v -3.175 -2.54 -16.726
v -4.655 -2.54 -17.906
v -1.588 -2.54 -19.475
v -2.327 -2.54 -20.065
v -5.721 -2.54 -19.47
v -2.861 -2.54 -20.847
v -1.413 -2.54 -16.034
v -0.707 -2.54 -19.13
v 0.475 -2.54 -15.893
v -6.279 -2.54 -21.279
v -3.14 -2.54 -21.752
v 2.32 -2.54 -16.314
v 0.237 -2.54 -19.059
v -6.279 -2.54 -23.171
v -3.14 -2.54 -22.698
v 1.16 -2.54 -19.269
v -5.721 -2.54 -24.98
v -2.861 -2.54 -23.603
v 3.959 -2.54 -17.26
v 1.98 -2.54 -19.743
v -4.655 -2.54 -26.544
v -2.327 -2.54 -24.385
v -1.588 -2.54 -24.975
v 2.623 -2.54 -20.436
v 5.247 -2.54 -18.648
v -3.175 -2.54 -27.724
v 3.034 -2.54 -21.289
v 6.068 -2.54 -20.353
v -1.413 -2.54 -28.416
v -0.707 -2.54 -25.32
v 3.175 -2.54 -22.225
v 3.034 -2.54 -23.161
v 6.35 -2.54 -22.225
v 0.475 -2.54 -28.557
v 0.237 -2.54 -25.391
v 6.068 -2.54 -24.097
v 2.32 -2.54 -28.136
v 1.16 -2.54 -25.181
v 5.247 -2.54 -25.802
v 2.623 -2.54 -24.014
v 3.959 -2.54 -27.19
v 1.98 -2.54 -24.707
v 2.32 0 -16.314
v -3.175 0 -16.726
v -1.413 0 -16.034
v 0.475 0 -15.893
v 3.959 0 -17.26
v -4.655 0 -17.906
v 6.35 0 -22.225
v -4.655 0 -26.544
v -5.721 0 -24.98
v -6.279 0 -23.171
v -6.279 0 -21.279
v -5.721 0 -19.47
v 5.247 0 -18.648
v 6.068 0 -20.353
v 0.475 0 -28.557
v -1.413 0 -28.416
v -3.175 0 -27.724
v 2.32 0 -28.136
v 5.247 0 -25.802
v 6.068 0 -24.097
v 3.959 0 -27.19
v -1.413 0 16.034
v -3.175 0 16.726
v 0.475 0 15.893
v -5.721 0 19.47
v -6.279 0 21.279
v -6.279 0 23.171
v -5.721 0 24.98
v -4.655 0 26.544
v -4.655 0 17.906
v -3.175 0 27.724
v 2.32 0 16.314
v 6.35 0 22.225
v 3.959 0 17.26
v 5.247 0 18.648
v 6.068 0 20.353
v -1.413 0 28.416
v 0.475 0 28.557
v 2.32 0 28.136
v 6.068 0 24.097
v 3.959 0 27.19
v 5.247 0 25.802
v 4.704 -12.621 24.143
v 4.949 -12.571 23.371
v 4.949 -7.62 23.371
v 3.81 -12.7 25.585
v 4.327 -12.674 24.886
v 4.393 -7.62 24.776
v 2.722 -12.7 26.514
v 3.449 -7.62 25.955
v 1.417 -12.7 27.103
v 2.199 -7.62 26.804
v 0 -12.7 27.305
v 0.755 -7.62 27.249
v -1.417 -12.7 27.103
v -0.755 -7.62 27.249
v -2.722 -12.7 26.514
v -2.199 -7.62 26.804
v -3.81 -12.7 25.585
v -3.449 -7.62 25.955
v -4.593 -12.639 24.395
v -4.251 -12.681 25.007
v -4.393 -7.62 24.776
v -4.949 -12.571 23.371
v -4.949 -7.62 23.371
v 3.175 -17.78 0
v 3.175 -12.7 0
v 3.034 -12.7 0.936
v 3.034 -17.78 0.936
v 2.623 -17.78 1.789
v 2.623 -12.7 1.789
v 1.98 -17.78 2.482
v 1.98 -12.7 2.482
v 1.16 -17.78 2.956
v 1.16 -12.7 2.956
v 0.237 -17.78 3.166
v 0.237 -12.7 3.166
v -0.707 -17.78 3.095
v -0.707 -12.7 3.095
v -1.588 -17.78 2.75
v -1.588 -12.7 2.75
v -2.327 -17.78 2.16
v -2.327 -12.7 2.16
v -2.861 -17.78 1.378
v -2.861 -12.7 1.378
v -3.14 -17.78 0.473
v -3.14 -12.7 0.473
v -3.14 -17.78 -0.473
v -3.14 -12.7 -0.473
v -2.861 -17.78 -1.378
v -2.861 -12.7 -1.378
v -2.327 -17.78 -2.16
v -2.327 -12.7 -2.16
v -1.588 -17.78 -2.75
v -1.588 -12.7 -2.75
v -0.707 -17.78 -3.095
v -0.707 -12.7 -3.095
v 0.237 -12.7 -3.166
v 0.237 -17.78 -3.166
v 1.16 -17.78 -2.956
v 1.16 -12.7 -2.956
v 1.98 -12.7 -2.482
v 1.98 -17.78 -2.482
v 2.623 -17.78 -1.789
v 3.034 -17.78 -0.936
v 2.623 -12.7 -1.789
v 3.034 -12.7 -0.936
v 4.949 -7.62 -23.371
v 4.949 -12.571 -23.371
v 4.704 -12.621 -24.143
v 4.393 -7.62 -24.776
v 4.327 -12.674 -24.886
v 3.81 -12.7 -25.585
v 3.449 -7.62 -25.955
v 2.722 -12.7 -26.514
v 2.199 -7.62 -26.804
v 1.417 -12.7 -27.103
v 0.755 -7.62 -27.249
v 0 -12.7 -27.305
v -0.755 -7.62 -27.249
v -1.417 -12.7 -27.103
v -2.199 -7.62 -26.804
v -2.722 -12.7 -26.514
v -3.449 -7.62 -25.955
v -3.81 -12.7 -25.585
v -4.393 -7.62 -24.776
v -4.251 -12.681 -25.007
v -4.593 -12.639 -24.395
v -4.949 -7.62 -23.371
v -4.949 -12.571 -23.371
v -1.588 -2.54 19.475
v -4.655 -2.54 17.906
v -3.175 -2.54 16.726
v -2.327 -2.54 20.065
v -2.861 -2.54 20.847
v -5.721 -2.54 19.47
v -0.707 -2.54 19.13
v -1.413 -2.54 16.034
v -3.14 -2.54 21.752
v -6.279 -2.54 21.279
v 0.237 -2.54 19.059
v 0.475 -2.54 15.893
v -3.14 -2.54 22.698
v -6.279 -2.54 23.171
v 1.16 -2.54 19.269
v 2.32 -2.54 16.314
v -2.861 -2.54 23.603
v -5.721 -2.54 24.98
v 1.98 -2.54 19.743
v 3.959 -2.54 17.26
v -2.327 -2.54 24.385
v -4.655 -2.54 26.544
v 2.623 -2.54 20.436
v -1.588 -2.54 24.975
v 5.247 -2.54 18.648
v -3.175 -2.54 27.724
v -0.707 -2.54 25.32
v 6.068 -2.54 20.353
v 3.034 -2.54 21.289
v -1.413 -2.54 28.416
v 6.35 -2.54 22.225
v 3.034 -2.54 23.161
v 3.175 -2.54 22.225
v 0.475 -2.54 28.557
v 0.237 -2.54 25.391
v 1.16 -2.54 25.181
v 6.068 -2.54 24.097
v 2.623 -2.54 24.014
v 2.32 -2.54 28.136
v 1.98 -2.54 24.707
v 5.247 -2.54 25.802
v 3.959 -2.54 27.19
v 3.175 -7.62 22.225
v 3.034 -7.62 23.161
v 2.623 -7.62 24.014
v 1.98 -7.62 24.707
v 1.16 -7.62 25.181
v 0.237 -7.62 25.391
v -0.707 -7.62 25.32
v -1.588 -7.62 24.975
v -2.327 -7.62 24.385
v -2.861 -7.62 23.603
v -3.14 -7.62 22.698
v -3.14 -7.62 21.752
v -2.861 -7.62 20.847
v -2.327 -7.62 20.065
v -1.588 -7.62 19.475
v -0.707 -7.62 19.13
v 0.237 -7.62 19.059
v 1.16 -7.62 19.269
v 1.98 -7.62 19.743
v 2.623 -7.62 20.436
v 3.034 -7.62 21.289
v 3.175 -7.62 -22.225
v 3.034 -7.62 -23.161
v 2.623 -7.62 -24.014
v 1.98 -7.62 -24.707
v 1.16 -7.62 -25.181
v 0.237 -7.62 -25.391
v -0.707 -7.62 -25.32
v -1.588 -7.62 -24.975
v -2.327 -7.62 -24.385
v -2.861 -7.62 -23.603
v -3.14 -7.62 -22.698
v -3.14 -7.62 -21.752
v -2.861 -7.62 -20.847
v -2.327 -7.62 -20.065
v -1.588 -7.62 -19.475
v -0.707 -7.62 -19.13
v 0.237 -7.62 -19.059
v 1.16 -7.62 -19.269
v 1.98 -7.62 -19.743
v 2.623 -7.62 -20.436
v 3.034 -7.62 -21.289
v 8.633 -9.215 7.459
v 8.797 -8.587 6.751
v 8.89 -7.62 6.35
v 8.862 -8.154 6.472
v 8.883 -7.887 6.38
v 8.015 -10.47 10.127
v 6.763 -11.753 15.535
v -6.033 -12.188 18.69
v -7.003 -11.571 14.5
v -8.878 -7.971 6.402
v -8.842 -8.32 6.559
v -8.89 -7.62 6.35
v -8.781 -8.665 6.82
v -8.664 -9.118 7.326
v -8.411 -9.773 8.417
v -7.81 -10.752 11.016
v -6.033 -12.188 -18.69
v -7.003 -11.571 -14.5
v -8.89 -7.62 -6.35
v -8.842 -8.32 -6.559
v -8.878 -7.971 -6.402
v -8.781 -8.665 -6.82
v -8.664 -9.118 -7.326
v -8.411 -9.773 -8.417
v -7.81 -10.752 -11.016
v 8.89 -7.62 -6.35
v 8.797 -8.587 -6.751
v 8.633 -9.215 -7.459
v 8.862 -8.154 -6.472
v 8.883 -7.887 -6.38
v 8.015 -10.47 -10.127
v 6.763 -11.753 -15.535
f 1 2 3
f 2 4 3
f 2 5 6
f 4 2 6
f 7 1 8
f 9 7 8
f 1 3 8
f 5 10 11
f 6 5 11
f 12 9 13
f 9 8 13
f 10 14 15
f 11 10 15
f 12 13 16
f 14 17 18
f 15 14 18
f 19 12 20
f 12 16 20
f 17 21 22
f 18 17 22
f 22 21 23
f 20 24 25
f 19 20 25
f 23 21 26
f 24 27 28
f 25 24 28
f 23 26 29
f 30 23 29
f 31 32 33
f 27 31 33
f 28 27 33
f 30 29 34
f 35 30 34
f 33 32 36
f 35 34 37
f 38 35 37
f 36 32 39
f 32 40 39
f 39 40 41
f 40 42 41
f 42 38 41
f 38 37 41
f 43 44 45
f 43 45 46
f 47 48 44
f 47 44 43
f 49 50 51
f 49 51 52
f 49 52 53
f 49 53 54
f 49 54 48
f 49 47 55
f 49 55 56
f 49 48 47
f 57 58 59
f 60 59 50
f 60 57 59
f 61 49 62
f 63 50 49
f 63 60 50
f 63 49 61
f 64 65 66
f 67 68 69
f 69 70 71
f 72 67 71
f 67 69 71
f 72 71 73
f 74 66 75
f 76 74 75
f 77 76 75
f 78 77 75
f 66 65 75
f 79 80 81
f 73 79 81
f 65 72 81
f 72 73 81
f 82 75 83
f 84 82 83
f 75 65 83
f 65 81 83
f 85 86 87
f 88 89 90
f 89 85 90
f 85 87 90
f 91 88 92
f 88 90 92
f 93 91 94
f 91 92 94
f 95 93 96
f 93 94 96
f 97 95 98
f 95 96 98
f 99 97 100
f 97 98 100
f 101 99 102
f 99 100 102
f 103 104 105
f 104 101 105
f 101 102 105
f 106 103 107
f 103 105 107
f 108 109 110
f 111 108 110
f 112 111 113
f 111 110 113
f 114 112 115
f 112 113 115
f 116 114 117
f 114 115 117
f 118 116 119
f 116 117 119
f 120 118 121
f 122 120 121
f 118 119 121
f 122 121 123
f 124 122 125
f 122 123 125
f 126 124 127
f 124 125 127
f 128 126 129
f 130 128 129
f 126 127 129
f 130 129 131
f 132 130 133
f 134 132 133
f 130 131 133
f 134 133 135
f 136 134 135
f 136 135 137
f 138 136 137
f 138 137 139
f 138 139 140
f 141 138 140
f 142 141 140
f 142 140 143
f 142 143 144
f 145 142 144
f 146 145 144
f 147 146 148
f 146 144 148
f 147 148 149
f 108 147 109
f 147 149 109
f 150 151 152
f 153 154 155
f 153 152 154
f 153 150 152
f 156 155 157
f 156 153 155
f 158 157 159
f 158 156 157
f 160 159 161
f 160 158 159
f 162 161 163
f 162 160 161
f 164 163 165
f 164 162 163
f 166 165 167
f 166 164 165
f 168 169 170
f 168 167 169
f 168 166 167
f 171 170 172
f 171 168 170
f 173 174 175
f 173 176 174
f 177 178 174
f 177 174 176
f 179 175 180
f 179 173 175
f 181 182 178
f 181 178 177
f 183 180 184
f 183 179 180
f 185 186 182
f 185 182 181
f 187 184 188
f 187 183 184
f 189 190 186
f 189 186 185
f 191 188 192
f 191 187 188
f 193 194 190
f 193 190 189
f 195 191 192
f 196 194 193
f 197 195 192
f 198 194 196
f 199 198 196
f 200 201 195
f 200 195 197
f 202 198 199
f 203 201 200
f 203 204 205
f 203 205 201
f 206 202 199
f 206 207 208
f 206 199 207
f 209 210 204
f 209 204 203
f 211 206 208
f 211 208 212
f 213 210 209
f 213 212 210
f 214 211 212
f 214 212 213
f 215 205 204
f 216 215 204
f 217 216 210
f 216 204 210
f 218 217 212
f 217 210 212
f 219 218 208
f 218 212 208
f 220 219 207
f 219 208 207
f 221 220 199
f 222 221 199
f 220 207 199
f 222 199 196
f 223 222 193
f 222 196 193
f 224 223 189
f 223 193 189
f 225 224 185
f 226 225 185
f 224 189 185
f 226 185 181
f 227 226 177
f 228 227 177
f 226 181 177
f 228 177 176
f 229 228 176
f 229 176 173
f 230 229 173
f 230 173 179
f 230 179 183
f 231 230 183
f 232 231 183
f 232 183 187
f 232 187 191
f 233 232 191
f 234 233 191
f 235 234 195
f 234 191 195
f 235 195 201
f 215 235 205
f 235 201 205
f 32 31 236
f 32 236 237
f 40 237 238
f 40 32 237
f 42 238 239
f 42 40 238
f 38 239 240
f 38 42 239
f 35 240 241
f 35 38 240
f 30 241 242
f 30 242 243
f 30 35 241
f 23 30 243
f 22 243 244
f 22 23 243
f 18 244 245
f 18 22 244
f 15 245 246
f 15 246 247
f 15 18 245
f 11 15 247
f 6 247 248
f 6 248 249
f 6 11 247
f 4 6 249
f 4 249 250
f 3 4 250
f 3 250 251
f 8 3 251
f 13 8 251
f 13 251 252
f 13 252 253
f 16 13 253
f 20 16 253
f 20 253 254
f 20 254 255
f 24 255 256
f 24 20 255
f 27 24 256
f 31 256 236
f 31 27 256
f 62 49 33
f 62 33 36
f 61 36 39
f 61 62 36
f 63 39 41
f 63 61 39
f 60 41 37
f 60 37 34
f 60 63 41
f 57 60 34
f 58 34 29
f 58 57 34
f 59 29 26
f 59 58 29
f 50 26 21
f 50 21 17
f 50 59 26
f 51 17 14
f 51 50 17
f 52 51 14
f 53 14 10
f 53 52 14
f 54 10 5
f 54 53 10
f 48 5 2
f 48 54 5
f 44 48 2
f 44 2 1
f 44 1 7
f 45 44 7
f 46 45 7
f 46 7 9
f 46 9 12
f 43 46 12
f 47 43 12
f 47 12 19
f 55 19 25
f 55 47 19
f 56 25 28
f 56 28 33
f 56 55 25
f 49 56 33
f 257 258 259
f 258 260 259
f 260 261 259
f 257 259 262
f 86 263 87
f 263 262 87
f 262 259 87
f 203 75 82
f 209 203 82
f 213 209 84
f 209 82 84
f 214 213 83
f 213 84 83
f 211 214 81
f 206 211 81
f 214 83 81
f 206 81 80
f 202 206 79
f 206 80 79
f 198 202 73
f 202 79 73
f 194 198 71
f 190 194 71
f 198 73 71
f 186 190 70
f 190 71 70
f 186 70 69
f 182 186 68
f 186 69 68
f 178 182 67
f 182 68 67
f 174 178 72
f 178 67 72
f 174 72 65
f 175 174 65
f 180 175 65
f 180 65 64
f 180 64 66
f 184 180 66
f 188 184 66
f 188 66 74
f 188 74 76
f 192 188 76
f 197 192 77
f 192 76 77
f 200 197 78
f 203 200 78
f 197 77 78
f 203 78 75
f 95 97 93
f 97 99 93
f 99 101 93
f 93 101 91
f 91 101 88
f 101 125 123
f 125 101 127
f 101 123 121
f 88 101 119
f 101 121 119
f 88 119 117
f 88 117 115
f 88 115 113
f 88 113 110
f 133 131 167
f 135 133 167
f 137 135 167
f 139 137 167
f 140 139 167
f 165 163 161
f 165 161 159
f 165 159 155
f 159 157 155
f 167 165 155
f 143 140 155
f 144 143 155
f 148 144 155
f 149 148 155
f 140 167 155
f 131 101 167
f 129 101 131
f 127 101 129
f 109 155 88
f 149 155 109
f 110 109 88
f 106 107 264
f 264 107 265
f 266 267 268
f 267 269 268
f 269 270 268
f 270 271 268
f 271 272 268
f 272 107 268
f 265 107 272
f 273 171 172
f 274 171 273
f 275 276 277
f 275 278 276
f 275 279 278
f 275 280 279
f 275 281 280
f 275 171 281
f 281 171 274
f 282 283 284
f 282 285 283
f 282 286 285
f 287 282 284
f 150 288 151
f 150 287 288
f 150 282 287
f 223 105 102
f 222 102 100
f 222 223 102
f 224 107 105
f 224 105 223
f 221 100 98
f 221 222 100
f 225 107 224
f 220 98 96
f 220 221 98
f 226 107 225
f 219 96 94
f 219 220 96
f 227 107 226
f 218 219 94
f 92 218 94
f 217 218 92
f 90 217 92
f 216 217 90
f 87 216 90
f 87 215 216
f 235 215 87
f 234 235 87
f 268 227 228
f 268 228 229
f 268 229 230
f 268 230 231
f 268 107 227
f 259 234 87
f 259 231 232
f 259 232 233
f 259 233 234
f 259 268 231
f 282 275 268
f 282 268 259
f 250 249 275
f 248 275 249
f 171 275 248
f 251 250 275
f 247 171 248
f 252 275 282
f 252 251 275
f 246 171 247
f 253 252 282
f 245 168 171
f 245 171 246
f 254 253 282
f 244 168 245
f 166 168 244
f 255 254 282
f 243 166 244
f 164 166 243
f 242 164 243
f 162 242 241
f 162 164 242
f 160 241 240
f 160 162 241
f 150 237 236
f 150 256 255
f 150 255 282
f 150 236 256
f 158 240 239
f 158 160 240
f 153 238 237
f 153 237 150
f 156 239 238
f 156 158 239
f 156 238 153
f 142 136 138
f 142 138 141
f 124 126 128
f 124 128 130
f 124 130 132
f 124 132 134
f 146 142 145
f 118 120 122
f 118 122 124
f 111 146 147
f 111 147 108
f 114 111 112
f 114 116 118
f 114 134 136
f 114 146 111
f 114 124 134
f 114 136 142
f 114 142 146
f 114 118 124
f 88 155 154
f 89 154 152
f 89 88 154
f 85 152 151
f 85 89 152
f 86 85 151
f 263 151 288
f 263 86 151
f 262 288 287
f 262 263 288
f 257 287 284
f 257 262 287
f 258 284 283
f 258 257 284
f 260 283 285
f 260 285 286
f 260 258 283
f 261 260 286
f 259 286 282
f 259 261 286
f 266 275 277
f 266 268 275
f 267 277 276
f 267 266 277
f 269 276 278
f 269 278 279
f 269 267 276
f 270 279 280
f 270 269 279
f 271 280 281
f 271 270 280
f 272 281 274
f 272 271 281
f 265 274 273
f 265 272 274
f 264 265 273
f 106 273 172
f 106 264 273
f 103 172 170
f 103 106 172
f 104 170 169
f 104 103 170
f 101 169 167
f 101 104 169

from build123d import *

# Parameters (mm, degrees)
F0_R     = 6.35
F1_DEPTH = 2.54
F2_R     = 3.175
F3_DEPTH = 5.08
F4_R     = 3.175
F4_W     = 17.78
F4_H     = 12.7
F5_DEPTH = 5.08
F7_R     = 5.07999
F8_R     = 3.175
F9_DEPTH = 5.08


# Not quite as in the source:
# - a fillet or chamfer is up to 0.001 mm smaller than in the source, because OpenCascade refuses the exact size


with BuildPart() as f1:
    # F0 (on Front) → F1 (new body)
    with BuildSketch(Plane.XZ):
        with Locations((0, 22.225)):
            Circle(F0_R)
    extrude(amount=F1_DEPTH)

    # F2 (on face) → F3 (join)
    with BuildSketch(Plane.XZ.offset(2.54)):
        with Locations((0, 22.225)):
            Circle(F2_R)
    extrude(amount=F3_DEPTH)

    # F4 (on face) → F5 (join)
    with BuildSketch(Plane.XZ.offset(7.62)):
        with BuildLine():
            ThreePointArc((4.9490759915, 23.3708825552), (5.0471628682, 22.8016688665), (5.08, 22.225))
            ThreePointArc((5.08, 22.225), (-0.5766688665, 17.1778371318), (-4.9490759915, 23.3708825552))
            Line((-4.9490759915, 23.3708825552), (-8.89, 6.35))
            Line((-8.89, 6.35), (8.89, 6.35))
            Line((8.89, 6.35), (4.9490759915, 23.3708825552))
        make_face()
        with BuildLine():
            ThreePointArc((-4.9490759915, 23.3708825552), (-0.5766688665, 17.1778371318), (5.08, 22.225))
            ThreePointArc((5.08, 22.225), (5.0471628682, 22.8016688665), (4.9490759915, 23.3708825552))
            ThreePointArc((4.9490759915, 23.3708825552), (0, 27.305), (-4.9490759915, 23.3708825552))
        make_face()
        with Locations((0, 22.225)):
            Circle(F4_R, mode=Mode.SUBTRACT)
        with Locations((0, 22.225)):
            Circle(F4_R)
        Rectangle(F4_W, F4_H)
    extrude(amount=F5_DEPTH)

    # F6: F1 across plane


with BuildPart() as f1_1:
    add(f1.part)
    add(f1.part.mirror(Plane.XY))

    # F7 (radius 5.08 in the source; OpenCascade refuses exactly that, so slightly less here)
    f7_edges = [f1_1.edges().sort_by_distance(p)[0] for p in [
        (-8.89, -12.7, 0),
        (8.89, -12.7, 0),
    ]]
    fillet(f7_edges, radius=F7_R)

    # F8 (on face) → F9 (join)
    with BuildSketch(Plane.XZ.offset(12.7)):
        Circle(F8_R)
    extrude(amount=F9_DEPTH)


solid = f1_1.part
